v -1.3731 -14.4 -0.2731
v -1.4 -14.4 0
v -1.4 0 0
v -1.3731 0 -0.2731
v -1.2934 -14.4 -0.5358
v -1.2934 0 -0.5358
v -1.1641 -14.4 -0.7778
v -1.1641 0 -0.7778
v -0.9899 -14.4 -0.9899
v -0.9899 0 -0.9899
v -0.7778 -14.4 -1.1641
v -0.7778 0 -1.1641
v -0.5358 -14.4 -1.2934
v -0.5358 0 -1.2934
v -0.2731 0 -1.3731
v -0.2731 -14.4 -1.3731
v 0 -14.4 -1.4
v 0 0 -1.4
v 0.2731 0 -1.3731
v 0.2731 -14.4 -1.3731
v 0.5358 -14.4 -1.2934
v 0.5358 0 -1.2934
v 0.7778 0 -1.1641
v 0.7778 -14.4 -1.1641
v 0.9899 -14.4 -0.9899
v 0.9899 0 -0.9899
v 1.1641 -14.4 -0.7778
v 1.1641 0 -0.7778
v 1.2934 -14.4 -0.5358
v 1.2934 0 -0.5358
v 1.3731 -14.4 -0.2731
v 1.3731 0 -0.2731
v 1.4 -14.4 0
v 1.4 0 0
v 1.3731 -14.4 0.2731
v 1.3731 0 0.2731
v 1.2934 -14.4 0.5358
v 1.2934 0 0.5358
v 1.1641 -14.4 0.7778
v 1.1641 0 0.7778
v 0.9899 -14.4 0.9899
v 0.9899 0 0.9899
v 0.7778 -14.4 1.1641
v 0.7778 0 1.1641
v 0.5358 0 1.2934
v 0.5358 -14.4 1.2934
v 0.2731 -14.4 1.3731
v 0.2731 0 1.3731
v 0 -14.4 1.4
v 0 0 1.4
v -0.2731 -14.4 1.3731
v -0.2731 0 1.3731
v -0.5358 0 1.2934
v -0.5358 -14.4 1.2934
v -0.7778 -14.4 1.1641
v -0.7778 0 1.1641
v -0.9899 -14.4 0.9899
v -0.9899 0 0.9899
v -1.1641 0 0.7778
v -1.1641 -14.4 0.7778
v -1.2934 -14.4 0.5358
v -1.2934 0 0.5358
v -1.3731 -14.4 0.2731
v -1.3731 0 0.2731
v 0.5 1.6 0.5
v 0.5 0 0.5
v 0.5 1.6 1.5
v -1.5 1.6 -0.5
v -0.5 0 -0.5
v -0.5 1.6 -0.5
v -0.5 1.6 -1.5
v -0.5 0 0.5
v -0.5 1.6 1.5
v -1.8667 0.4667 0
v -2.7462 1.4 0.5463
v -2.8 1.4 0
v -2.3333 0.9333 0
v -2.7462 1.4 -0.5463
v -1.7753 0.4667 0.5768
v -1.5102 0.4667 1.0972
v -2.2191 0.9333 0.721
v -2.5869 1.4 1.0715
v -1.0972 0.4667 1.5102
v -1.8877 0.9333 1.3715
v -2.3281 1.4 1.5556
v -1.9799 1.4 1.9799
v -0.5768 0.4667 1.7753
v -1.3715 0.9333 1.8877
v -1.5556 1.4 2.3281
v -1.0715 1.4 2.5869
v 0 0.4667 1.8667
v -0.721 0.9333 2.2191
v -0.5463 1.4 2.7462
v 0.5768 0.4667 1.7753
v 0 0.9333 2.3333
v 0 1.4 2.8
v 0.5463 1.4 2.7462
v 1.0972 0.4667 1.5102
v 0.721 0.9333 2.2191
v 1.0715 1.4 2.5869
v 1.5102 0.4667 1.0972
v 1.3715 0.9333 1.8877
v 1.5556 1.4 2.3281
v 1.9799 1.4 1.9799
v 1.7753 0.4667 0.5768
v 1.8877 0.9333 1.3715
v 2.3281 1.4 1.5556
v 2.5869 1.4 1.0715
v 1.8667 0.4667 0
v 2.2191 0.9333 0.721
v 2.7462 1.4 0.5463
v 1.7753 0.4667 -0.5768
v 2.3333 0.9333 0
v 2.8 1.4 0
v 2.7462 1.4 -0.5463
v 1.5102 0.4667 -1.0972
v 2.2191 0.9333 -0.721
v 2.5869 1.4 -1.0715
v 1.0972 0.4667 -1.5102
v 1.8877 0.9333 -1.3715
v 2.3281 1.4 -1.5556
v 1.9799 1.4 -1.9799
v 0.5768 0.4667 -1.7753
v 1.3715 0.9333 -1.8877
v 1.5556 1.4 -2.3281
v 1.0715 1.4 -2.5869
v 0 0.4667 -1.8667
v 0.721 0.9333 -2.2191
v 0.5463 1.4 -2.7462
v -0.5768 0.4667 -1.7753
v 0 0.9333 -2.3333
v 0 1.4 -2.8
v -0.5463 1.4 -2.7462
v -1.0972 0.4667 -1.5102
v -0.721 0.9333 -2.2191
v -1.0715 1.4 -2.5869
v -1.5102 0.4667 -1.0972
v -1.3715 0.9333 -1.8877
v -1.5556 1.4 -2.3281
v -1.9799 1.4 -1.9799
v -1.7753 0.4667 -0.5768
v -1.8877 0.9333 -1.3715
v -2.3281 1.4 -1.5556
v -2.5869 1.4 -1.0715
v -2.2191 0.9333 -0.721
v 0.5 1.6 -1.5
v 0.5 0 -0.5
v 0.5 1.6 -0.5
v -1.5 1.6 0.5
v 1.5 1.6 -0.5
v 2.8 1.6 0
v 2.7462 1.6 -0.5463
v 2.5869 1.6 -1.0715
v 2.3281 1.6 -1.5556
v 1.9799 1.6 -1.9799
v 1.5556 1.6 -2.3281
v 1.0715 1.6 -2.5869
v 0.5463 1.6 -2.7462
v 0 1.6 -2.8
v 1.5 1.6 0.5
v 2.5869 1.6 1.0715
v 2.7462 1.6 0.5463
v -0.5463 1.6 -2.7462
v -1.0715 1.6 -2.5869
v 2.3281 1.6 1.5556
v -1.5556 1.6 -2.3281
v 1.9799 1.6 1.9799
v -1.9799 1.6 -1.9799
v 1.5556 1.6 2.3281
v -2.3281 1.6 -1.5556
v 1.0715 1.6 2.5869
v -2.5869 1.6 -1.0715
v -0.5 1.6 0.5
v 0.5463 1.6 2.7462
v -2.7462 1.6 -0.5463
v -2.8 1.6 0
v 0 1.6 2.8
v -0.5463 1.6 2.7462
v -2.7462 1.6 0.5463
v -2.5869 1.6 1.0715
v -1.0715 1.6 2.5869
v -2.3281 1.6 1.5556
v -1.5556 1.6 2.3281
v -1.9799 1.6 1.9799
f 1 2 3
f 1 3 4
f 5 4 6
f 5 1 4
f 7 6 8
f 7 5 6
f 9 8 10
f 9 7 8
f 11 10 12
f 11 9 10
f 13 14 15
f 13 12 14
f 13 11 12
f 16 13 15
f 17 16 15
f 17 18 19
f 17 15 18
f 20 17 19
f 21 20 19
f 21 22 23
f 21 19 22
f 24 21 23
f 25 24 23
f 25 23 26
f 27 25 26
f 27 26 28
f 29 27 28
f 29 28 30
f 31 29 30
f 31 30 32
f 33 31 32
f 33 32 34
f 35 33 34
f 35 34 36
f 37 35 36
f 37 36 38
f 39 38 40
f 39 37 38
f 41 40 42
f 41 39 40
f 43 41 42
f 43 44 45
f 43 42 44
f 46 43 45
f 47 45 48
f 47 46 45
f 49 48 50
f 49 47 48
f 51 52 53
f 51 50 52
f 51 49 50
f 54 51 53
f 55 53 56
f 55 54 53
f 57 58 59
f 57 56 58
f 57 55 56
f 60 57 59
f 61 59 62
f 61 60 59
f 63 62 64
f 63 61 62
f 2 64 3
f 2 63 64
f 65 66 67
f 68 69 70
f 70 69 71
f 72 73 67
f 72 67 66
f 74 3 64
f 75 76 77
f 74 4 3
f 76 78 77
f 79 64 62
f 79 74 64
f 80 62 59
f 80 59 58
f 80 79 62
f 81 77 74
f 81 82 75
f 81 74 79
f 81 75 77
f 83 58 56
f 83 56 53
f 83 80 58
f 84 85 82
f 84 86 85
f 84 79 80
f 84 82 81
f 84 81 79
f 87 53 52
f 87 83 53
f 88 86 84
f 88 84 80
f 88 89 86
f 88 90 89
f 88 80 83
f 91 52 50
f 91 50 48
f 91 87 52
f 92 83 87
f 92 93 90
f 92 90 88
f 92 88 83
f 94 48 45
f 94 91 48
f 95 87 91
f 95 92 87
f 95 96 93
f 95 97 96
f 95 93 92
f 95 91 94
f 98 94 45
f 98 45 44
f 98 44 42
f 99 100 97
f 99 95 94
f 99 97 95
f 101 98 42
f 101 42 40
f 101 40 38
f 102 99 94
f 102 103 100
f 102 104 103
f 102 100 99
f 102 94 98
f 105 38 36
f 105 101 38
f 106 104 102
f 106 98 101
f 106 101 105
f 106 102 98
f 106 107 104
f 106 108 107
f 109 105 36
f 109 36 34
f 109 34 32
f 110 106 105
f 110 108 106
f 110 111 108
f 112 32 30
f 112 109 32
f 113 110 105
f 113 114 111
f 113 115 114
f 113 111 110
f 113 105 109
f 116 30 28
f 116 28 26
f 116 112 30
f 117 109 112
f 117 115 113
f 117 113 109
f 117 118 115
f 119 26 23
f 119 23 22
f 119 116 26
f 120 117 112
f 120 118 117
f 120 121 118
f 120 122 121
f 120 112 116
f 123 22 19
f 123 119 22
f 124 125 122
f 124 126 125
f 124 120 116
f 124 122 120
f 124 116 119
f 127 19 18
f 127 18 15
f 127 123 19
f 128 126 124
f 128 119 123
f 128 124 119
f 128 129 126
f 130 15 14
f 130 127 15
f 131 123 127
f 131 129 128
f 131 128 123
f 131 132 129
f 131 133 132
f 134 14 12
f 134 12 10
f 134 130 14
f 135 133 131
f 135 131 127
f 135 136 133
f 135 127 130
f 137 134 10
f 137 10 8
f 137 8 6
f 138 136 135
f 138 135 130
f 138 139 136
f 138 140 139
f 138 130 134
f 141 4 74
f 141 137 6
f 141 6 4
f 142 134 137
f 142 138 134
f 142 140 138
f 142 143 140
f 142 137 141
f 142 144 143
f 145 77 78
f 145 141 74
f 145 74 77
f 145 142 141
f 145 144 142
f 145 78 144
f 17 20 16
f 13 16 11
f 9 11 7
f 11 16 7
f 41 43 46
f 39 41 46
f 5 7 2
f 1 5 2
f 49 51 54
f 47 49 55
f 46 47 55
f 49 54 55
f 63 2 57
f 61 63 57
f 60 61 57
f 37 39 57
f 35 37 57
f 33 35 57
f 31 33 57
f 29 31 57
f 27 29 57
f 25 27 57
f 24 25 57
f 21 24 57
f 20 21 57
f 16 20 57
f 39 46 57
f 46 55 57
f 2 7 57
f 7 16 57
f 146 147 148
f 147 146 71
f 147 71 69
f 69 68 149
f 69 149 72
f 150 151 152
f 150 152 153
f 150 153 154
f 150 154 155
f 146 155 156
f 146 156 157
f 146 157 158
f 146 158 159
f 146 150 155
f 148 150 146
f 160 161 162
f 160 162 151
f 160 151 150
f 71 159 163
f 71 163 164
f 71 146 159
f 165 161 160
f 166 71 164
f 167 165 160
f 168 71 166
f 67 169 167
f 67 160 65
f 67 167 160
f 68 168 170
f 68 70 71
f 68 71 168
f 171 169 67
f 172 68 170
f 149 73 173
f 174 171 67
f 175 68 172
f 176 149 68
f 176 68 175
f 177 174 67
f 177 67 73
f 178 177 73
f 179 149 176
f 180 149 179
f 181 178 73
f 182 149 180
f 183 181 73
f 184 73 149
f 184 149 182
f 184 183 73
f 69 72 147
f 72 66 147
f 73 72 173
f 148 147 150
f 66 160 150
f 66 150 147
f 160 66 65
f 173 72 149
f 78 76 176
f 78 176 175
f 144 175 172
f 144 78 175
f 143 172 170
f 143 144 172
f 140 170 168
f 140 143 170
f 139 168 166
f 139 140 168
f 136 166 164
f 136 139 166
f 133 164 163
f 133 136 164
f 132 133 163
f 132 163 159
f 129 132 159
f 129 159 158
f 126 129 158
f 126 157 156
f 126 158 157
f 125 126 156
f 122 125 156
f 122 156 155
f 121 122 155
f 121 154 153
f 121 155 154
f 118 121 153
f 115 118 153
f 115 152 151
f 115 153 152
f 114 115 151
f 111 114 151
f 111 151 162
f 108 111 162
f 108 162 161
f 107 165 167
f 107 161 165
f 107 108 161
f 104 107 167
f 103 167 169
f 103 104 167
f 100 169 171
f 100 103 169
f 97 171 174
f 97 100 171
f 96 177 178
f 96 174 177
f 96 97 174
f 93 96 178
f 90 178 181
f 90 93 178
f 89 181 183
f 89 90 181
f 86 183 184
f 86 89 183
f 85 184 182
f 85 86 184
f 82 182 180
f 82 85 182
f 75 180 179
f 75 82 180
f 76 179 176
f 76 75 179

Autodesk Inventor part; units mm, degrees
ref_plane "YZ Plane" through (0, 0, 0) normal (1, 0, 0) x (0, 1, 0)
ref_plane "XZ Plane" through (0, 0, 0) normal (0, 1, 0) x (-1, 0, 0)
ref_plane "XY Plane" through (0, 0, 0) normal (0, 0, 1) x (1, 0, 0)
sketch "Эскиз1" plane through (0, 0, 0) normal (0, 0, 1) x (1, 0, 0)
  line L0 (-1.4, 0) -> (-1.4, -14.4)
  line L1 (-1.4, -14.4) -> (0, -14.4)
  line L2 (0, -14.4) -> (0, 1.6)
  line L3 (0, 1.6) -> (-2.8, 1.6)
  line L4 (-2.8, 1.6) -> (-2.8, 1.4)
  line L5 (-2.8, 1.4) -> (-1.4, 0)
  point P0 (0, 0)
  dimension "d0" = 2.8
  dimension "d2" = 45
  dimension "d3" = 1.6
  dimension "d4" = 16
  dimension "d5" = 5.6
revolve "Вращение1" add sketch "Эскиз1" angle 360 about axis through (0, -14.4, 0) along (0, 1, 0)
sketch "Эскиз2" plane through (0, 0, 0) normal (1, 0, 0) x (0, 1, 0)
  line L0 (1.6, -2.8) -> (1.6, 2.8) projected
  line L1 (1.6, 1.5) -> (1.6, 0)
  line L2 (0, 0) -> (1.6, 0)
  line L3 (1.6, 1.5) -> (0, 0.5)
  line L4 (0, -1.4) -> (0, 1.4) projected
  line L5 (0, 0) -> (0, 0.5)
  dimension "d7" = 1.5
  dimension "d13" = 0.5
extrude "Выдавливание1" cut sketch "Эскиз2" along normal mid plane 1
pattern_circular "Круговой массив1" count 4 over 360 about axis through (0, -10, 0) along (0, 1, 0) of "Выдавливание1"
thread "Резьба1" size "M3x0.5" class "6g" standard "ANSI Metric M Profile" full length
properties part number "M3x10P"
